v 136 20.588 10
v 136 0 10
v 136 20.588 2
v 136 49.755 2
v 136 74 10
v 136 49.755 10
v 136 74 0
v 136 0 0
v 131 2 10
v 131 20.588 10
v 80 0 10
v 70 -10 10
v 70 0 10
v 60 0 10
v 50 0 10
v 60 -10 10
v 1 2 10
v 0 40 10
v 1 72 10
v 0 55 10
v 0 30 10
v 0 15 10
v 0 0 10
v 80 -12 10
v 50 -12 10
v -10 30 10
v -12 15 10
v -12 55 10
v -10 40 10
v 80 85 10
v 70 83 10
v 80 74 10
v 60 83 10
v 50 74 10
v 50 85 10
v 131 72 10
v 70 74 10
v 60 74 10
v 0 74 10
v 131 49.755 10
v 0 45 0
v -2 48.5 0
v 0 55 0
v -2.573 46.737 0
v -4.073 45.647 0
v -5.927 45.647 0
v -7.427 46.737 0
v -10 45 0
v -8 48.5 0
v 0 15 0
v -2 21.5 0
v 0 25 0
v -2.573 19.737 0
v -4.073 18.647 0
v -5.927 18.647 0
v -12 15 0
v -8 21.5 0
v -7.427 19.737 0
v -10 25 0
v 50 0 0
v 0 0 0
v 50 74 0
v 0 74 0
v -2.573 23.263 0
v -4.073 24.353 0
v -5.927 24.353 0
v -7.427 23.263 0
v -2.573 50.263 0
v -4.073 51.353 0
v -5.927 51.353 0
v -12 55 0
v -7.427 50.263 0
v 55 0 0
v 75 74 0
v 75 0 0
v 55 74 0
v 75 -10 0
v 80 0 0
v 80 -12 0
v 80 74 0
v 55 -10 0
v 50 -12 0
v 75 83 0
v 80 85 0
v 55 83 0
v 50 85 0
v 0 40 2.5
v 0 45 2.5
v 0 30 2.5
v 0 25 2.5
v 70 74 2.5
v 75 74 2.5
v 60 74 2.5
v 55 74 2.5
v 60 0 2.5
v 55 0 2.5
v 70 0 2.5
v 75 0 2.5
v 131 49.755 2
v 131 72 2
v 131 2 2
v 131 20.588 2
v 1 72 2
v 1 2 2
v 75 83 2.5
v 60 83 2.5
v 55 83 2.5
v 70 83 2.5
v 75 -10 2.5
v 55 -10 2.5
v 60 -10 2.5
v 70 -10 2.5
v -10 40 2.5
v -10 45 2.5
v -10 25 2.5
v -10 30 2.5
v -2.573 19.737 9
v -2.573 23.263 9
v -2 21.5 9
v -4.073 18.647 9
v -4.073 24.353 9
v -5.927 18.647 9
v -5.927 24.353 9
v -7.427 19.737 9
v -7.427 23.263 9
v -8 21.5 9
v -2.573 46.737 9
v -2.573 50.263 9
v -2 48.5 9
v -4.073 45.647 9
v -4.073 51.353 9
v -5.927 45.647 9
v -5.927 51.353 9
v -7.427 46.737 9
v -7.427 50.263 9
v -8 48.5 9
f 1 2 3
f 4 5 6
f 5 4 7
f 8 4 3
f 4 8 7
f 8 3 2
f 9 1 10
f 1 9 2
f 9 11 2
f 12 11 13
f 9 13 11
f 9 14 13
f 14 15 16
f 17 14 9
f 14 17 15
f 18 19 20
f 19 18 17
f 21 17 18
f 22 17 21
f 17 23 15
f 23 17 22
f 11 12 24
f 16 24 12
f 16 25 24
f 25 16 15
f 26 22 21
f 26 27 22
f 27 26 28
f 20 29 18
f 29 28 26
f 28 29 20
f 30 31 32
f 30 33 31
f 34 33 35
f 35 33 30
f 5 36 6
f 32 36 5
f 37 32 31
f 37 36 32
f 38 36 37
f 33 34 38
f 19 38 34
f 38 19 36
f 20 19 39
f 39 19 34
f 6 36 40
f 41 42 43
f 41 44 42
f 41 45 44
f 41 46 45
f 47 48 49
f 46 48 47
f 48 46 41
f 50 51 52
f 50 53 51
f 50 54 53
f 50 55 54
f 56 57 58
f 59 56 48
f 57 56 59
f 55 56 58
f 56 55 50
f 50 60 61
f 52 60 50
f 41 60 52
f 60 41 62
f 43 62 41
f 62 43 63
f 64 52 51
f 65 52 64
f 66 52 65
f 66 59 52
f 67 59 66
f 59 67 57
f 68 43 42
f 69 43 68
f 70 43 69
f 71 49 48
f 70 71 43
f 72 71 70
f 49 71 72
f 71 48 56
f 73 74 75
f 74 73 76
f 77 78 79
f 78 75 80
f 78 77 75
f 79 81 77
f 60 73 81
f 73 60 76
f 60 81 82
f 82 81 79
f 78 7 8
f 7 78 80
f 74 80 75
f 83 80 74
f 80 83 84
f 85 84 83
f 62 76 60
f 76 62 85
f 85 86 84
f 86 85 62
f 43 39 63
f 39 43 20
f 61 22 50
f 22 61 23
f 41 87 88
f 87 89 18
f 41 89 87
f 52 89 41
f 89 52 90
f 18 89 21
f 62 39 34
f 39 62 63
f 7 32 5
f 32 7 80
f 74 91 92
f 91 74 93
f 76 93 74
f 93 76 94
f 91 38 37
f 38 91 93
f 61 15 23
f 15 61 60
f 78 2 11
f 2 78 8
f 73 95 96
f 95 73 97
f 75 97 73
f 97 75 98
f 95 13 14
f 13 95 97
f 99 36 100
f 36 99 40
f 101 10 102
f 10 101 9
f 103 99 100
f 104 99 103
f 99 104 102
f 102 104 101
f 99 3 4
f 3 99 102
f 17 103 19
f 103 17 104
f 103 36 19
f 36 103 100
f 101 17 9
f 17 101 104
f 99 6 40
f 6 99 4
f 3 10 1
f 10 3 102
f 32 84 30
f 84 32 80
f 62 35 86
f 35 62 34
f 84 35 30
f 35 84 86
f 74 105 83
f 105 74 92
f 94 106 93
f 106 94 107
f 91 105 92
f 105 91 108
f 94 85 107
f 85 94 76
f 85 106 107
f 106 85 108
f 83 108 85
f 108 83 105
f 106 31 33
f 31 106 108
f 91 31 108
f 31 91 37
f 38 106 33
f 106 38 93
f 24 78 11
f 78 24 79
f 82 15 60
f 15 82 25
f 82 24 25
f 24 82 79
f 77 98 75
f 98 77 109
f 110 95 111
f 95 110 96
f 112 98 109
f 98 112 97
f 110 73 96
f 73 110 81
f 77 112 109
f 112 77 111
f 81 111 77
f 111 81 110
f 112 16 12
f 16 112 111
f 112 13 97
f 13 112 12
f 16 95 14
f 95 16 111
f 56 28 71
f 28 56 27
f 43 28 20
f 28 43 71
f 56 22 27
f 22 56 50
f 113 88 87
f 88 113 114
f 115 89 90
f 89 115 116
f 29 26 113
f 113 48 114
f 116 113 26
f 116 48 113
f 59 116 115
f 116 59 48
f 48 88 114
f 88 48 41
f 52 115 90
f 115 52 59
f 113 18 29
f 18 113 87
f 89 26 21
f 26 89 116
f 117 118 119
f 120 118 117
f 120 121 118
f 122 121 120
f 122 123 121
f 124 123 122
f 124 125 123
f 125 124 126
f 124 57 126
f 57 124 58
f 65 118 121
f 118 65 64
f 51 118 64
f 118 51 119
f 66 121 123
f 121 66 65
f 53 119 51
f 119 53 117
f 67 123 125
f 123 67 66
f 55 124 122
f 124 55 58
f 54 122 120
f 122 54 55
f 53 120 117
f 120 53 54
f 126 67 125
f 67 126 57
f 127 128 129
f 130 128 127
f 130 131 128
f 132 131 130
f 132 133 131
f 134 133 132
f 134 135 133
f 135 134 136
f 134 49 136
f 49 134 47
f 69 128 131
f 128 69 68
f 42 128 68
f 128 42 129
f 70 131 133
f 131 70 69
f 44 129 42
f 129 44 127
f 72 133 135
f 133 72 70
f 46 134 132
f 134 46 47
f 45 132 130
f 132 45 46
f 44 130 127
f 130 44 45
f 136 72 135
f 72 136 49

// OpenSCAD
Length=130;
Width=70;

difference(){cube([Length+6,Width+4,10]);
translate([1,2,2])cube([Length,Width,10]);
translate([Length,Width/3.4,2])cube([50,Width/2.4,10]);}


translate([Length-130,Width-69,0])
union(){difference(){translate([50,72,0])cube([30,12,10]);
translate([55,72,-17.5])cube([20,10,20]);
translate([60,72,-15])cube([10,10,30]);}}

translate([Length-130,5,0])
union(){difference(){translate([50,-17,0])cube([30,12,10]);
translate([55,-15,-17.5])cube([20,10,20]);
translate([60,-15,-15])cube([10,10,30]);}}

translate([0,(Width/2)-35,0])
union(){difference(){translate([-12,15,0])cube([12,40,10]);
translate([-10,25,-17.5])cube([10,20,20]);
translate([-10,30,-15])cube([10,10,30]);
translate([-5,21.5,-6])cylinder(r=3,h=15);
translate([-5,48.5,-6])cylinder(r=3,h=15);
}}
